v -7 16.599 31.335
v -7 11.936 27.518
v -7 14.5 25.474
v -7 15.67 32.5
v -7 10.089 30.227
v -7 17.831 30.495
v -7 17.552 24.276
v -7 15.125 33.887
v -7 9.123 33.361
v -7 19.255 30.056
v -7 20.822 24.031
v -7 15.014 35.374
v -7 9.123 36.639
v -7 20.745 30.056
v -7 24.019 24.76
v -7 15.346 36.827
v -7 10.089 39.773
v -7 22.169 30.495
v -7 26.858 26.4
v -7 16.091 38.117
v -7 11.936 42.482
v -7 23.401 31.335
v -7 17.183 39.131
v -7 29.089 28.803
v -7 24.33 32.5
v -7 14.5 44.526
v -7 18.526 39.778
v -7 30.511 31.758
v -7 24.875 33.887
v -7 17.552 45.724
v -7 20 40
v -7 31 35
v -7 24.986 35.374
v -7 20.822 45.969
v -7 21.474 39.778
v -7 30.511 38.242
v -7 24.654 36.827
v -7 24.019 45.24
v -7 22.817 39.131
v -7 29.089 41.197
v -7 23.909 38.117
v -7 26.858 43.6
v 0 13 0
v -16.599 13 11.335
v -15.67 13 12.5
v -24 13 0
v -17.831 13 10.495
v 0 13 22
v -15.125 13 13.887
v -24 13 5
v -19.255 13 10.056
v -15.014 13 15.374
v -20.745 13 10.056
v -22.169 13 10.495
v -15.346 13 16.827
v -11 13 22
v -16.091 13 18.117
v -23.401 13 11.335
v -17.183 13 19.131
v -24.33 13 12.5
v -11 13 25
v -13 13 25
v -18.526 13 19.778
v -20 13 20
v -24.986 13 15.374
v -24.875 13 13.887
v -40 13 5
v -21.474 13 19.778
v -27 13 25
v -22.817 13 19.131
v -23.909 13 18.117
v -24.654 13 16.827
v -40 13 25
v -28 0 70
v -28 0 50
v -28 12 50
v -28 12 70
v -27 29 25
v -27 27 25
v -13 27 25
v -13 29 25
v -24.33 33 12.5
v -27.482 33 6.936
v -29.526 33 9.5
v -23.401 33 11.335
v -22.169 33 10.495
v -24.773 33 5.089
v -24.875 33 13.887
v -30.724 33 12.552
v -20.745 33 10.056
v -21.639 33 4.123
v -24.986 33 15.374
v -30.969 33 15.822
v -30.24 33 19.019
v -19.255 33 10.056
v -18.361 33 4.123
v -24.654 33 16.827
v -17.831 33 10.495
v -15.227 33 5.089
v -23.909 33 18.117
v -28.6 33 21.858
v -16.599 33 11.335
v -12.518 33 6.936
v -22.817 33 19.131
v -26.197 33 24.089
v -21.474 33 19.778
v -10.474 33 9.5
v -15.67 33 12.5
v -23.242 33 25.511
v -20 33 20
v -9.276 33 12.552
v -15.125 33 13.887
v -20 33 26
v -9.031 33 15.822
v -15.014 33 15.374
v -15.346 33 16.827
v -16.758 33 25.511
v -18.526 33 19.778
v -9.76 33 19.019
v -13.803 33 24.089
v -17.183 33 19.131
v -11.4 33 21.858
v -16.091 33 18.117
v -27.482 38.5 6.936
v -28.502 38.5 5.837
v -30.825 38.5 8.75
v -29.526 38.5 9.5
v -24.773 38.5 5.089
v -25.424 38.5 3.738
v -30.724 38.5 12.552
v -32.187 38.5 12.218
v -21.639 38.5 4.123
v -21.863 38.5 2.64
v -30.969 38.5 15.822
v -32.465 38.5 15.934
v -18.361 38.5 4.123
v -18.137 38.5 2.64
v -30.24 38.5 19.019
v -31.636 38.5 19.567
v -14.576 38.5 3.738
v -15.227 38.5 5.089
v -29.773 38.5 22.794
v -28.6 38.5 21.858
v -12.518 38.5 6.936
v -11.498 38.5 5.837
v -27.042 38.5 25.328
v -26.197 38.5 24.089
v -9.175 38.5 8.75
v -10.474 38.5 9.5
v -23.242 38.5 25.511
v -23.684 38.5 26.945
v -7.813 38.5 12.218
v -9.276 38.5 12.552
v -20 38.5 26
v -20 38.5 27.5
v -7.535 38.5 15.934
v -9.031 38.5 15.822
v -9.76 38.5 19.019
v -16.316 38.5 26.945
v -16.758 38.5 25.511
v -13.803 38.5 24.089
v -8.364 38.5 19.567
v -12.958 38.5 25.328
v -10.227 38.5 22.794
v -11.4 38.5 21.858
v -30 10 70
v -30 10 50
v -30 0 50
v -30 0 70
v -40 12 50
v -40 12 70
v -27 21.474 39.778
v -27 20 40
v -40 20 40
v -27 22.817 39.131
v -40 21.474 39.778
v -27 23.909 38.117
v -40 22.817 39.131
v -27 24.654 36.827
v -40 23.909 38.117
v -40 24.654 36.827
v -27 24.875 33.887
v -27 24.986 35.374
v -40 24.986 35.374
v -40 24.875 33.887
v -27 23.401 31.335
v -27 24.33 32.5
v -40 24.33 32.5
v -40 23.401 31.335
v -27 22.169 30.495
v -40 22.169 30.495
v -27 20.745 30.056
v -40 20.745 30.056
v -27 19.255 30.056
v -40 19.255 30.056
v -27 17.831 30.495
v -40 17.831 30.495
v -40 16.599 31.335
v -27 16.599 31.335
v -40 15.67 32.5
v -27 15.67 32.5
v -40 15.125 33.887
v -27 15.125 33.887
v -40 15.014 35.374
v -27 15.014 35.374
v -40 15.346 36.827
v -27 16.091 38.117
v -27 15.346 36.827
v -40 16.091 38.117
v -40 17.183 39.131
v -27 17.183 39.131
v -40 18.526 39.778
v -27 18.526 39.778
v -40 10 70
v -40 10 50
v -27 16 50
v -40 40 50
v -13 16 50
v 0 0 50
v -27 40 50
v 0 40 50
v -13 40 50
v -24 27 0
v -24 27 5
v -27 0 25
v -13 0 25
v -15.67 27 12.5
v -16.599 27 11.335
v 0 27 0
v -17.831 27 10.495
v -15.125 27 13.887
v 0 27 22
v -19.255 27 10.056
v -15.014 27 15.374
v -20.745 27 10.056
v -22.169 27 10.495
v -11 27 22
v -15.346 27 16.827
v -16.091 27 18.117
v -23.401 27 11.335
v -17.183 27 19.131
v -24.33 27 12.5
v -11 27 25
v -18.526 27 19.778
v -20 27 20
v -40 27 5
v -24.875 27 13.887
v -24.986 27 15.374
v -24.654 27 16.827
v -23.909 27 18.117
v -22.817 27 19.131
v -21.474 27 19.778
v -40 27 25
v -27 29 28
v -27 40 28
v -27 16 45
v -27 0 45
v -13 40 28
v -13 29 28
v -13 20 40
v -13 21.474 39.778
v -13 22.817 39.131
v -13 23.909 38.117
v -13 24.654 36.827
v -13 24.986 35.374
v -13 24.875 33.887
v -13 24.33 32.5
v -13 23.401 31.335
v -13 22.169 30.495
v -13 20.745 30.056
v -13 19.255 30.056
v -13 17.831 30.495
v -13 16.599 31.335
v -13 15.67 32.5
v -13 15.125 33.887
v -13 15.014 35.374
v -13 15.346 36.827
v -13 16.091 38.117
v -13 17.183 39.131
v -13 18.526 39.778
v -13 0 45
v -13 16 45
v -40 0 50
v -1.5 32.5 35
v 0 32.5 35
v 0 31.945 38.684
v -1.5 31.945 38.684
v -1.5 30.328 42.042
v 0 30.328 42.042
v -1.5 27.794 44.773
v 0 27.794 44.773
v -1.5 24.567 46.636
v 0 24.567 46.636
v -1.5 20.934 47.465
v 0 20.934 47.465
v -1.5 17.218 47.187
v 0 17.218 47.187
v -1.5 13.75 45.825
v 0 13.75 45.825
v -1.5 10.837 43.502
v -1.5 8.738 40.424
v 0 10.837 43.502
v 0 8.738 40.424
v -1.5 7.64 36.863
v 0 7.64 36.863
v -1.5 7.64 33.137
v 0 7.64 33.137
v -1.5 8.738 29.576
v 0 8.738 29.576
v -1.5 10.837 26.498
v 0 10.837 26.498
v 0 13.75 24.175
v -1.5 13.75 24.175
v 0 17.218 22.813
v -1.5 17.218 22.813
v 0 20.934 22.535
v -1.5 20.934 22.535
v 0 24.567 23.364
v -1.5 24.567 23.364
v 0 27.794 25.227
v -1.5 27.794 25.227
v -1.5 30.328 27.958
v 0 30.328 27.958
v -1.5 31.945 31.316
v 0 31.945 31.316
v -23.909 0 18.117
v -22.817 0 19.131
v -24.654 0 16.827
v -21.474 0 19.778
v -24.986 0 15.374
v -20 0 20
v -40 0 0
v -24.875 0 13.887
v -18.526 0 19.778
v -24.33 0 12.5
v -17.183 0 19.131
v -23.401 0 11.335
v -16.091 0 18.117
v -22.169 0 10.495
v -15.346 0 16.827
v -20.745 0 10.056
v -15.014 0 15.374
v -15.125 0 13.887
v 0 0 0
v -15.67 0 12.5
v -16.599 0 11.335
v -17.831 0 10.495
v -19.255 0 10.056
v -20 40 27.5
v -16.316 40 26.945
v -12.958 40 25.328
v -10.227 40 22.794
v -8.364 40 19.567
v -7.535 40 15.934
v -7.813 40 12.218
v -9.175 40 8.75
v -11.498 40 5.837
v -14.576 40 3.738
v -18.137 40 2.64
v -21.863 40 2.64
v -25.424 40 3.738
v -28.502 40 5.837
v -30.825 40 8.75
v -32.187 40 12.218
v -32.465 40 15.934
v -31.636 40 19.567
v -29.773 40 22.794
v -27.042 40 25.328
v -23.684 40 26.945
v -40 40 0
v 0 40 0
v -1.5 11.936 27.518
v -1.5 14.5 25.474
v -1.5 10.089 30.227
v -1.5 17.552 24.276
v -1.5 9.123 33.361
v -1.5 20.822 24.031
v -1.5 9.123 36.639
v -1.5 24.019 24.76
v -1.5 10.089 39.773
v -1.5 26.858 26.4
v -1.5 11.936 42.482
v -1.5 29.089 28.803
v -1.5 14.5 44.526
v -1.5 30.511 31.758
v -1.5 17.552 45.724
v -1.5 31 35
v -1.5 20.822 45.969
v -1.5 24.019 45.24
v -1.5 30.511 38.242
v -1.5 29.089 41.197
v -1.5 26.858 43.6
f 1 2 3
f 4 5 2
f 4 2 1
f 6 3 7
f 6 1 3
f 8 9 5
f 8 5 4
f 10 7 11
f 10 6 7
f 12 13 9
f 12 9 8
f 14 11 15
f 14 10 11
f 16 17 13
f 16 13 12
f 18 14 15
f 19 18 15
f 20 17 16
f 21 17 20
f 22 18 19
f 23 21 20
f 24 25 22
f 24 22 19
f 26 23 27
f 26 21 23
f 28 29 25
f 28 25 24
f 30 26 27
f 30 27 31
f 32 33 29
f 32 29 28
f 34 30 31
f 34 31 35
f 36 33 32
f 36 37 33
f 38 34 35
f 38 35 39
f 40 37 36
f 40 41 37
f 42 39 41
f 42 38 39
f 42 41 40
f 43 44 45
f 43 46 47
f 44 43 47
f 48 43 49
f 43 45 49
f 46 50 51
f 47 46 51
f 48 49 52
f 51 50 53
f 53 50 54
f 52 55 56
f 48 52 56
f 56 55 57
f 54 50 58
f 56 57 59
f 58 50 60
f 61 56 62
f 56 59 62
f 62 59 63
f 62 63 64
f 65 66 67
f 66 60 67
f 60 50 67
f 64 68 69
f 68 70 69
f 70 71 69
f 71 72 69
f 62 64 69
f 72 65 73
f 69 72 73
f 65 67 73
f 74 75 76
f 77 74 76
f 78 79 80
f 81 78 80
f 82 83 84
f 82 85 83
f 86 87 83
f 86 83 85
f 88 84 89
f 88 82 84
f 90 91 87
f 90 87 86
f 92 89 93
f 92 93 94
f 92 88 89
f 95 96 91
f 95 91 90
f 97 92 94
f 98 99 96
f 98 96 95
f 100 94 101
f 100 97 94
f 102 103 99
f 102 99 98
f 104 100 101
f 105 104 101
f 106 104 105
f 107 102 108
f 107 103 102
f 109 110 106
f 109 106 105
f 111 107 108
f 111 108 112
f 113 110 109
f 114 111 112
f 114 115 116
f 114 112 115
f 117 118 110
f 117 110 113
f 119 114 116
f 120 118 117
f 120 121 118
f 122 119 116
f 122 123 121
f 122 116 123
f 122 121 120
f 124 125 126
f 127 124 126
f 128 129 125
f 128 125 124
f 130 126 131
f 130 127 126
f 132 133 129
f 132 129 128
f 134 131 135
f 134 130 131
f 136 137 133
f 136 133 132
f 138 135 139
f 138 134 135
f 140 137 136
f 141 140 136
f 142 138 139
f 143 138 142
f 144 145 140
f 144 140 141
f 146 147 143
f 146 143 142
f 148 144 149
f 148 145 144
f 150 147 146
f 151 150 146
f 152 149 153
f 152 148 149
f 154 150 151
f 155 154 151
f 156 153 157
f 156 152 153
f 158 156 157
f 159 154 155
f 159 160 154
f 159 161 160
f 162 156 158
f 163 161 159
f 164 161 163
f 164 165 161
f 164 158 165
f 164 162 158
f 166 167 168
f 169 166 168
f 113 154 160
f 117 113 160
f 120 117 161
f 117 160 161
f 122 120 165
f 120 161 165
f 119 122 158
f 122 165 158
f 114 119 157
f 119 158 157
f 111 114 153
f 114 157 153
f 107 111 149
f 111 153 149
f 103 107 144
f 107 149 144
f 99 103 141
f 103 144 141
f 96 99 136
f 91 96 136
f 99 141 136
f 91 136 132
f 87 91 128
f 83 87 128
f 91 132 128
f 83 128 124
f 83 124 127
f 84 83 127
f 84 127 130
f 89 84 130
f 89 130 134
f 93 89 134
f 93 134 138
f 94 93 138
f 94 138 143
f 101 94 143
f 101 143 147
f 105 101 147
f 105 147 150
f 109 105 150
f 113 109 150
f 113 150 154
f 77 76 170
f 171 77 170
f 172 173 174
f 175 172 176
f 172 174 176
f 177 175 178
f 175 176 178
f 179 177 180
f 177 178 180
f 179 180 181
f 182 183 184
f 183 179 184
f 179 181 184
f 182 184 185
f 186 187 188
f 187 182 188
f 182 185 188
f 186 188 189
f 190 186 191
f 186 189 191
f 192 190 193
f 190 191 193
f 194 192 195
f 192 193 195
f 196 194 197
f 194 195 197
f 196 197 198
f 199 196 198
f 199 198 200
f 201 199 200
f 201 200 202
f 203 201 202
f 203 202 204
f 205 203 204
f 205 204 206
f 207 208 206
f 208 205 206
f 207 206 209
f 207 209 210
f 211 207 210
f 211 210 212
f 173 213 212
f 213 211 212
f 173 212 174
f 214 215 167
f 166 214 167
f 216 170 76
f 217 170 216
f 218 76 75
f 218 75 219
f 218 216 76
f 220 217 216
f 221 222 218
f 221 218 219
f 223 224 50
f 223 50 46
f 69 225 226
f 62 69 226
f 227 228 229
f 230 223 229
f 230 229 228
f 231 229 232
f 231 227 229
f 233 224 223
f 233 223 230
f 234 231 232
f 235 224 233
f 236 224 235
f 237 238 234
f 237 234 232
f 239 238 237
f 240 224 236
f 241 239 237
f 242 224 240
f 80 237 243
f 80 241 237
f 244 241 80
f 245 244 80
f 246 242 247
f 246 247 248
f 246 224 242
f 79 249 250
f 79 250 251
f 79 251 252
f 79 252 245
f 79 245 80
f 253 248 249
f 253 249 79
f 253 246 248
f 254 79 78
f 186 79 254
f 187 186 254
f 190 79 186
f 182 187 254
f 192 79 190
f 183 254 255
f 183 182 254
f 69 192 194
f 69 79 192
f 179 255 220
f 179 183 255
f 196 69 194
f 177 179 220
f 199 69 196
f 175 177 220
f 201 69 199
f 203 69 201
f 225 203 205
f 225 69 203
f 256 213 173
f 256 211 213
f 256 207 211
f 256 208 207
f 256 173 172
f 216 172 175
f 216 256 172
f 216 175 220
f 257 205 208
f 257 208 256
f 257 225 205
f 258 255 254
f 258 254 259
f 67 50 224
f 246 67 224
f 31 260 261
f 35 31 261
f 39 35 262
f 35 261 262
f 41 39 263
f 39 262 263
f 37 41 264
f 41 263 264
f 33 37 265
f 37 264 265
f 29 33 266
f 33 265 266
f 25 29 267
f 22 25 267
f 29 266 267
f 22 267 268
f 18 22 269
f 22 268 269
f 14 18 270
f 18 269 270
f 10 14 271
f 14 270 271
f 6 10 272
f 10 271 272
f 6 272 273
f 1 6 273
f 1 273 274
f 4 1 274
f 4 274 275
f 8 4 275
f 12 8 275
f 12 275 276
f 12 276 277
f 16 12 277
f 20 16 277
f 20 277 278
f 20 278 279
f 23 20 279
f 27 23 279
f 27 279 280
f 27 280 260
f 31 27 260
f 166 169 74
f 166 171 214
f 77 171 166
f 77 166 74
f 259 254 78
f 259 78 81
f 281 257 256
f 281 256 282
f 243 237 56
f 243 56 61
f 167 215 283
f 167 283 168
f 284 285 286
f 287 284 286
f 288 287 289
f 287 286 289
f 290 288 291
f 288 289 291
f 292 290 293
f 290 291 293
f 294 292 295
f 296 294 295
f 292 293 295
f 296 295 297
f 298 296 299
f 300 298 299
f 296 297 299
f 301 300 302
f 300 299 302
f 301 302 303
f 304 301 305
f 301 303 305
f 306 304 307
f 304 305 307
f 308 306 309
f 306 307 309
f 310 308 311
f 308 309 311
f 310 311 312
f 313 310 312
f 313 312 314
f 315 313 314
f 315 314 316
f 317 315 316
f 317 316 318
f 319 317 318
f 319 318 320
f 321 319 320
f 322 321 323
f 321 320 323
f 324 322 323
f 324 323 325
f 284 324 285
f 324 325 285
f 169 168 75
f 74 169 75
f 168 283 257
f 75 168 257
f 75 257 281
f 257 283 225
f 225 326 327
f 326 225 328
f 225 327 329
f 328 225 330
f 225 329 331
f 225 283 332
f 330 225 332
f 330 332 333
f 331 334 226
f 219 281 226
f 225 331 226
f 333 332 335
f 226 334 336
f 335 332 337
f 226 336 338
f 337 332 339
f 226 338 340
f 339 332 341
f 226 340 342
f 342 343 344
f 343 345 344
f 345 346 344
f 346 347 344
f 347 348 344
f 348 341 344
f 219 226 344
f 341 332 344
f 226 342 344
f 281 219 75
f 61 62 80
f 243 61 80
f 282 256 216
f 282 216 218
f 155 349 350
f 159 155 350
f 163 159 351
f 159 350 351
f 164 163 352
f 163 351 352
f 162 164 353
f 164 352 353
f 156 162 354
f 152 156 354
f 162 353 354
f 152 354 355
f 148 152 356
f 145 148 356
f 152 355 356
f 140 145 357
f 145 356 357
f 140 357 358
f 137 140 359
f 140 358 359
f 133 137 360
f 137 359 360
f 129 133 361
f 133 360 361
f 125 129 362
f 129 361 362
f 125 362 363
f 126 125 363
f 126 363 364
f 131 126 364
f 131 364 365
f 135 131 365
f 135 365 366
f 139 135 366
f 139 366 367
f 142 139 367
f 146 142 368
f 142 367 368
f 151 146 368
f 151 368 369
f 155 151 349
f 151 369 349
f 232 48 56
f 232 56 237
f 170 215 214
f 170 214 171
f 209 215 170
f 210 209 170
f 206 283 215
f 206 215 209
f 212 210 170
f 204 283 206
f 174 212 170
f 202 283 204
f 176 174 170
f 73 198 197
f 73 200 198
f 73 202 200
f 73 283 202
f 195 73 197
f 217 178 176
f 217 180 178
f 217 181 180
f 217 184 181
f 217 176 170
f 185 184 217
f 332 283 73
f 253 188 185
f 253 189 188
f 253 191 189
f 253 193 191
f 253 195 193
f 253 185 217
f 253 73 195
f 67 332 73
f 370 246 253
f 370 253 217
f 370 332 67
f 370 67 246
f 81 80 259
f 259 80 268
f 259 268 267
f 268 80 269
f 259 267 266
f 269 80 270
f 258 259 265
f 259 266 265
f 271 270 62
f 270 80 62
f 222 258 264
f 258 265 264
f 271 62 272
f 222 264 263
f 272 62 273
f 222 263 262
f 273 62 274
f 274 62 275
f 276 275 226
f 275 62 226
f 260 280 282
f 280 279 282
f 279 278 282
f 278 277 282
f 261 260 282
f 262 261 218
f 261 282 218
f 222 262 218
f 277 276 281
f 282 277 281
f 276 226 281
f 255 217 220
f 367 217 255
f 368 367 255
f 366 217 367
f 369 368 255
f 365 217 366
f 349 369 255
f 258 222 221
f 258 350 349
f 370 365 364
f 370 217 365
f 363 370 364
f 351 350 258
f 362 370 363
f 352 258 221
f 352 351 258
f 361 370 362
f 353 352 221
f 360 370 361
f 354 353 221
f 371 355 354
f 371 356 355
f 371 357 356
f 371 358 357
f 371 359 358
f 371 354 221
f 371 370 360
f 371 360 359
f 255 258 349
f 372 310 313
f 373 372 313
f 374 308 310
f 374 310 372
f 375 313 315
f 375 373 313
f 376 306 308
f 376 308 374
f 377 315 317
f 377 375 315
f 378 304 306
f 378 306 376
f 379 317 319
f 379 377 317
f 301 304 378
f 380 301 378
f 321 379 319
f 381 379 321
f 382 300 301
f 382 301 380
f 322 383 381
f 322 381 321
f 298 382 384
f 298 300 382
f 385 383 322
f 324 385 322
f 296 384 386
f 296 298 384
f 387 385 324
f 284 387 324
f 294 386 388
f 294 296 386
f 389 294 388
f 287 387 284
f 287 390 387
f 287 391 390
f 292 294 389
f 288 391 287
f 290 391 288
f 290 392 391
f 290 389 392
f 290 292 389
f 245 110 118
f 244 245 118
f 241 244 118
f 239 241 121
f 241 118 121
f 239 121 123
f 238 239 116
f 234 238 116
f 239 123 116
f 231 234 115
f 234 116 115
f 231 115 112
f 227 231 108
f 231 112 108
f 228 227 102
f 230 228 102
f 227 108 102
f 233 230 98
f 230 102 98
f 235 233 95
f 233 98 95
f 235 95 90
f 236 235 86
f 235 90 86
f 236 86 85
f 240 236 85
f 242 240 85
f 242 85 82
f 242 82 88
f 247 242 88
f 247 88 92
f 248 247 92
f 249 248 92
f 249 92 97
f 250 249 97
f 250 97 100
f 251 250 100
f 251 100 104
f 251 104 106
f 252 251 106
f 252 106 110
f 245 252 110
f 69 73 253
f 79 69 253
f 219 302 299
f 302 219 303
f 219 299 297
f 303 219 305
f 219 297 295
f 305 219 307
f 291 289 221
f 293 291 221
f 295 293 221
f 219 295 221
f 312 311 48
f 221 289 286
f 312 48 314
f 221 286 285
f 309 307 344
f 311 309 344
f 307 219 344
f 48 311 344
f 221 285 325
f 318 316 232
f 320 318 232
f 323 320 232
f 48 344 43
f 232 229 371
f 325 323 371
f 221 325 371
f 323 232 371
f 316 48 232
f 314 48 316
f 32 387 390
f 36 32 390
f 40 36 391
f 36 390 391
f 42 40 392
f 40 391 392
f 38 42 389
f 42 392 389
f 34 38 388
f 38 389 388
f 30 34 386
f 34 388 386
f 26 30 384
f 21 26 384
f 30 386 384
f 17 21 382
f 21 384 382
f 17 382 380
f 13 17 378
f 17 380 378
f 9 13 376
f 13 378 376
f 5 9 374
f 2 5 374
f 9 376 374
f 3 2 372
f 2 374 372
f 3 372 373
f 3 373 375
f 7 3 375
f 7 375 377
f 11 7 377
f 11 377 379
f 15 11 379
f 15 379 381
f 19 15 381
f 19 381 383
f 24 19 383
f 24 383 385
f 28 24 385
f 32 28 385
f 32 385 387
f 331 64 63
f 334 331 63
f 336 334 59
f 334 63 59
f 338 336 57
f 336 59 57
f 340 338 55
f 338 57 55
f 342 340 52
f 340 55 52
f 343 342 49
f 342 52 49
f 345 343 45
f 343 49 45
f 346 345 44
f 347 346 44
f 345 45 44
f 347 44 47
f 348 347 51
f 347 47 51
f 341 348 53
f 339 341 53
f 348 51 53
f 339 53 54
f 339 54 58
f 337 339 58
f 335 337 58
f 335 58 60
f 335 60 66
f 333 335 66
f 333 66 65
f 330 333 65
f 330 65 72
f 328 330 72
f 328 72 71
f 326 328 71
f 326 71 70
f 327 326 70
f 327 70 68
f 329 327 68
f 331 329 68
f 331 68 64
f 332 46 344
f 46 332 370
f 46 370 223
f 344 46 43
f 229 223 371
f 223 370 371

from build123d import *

# Parameters (mm, degrees)
ESQUISSE1_W              = 40
ESQUISSE1_H              = 40
BOSS_EXTRU_1_DEPTH       = 50
ESQUISSE2_R              = 5
ENL_V_MAT_EXTRU_1_DEPTH  = 41
ESQUISSE3_R              = 5
ENL_V_MAT_EXTRU_2_DEPTH  = 41
ESQUISSE4_W              = 20
ESQUISSE4_H              = 14
ENL_V_MAT_EXTRU_3_DEPTH  = 29
ESQUISSE5_W              = 14
ESQUISSE5_H              = 20
ENL_V_MAT_EXTRU_4_DEPTH  = 29
ESQUISSE6_W              = 22
ESQUISSE6_H              = 14
ENL_V_MAT_EXTRU_5_DEPTH  = 24
ESQUISSE7_W              = 14
ESQUISSE7_H              = 22
ENL_V_MAT_EXTRU_6_DEPTH  = 24
ESQUISSE8_R              = 11
ENL_V_MAT_EXTRU_7_DEPTH  = 7
ESQUISSE9_R              = 12.5
ENL_V_MAT_EXTRU_8_DEPTH  = 1.5
ESQUISSE10_R             = 11
ENL_V_MAT_EXTRU_9_DEPTH  = 7
ESQUISSE11_R             = 12.5
ENL_V_MAT_EXTRU_10_DEPTH = 1.5
BOSS_EXTRU_2_DEPTH       = 20


with BuildPart() as part:
    # Esquisse1 → Boss.-Extru.1 (new body)
    with BuildSketch(Plane.XY):
        with Locations((-20, 20)):
            Rectangle(ESQUISSE1_W, ESQUISSE1_H)
    extrude(amount=BOSS_EXTRU_1_DEPTH)

    # Esquisse2 → Enlèv. mat.-Extru.1 (cut, through all)
    with BuildSketch(Plane(origin=(0, 40, 0), x_dir=(1, 0, 0), z_dir=(0, 1, 0))):
        with Locations(Location((-20, -15, 0), (0, 0, 270))):  # turned: the seam where the file's is
            Circle(ESQUISSE2_R)
    extrude(amount=-ENL_V_MAT_EXTRU_1_DEPTH, mode=Mode.SUBTRACT)

    # Esquisse3 → Enlèv. mat.-Extru.2 (cut, through all)
    with BuildSketch(Plane.ZY.offset(40)):
        with Locations((35, 20)):
            Circle(ESQUISSE3_R)
    extrude(amount=-ENL_V_MAT_EXTRU_2_DEPTH, mode=Mode.SUBTRACT)

    # Esquisse4 → Enlèv. mat.-Extru.3 (cut)
    with BuildSketch(Plane.ZY.offset(40)):
        with Locations((15, 20)):
            Rectangle(ESQUISSE4_W, ESQUISSE4_H)
    extrude(amount=-ENL_V_MAT_EXTRU_3_DEPTH, mode=Mode.SUBTRACT)

    # Esquisse5 → Enlèv. mat.-Extru.4 (cut)
    with BuildSketch(Plane.XZ):
        with Locations((-20, 35)):
            Rectangle(ESQUISSE5_W, ESQUISSE5_H)
    extrude(amount=-ENL_V_MAT_EXTRU_4_DEPTH, mode=Mode.SUBTRACT)

    # Esquisse6 → Enlèv. mat.-Extru.5 (cut)
    with BuildSketch(Plane(origin=(0, 0, 0), x_dir=(0, 0, -1), z_dir=(1, 0, 0))):
        with Locations((-11, 20)):
            Rectangle(ESQUISSE6_W, ESQUISSE6_H)
    extrude(amount=-ENL_V_MAT_EXTRU_5_DEPTH, mode=Mode.SUBTRACT)

    # Esquisse7 → Enlèv. mat.-Extru.6 (cut)
    with BuildSketch(Plane(origin=(0, 40, 0), x_dir=(1, 0, 0), z_dir=(0, 1, 0))):
        with Locations((-20, -39)):
            Rectangle(ESQUISSE7_W, ESQUISSE7_H)
    extrude(amount=-ENL_V_MAT_EXTRU_6_DEPTH, mode=Mode.SUBTRACT)

    # Esquisse8 → Enlèv. mat.-Extru.7 (cut)
    with BuildSketch(Plane(origin=(0, 0, 0), x_dir=(0, 0, -1), z_dir=(1, 0, 0))):
        with Locations(Location((-35, 20, 0), (0, 0, 90))):  # turned: the seam where the file's is
            Circle(ESQUISSE8_R)
    extrude(amount=-ENL_V_MAT_EXTRU_7_DEPTH, mode=Mode.SUBTRACT)

    # Esquisse9 → Enlèv. mat.-Extru.8 (cut)
    with BuildSketch(Plane(origin=(0, 0, 0), x_dir=(0, 0, -1), z_dir=(1, 0, 0))):
        with Locations(Location((-35, 20, 0), (0, 0, 90))):  # turned: the seam where the file's is
            Circle(ESQUISSE9_R)
    extrude(amount=-ENL_V_MAT_EXTRU_8_DEPTH, mode=Mode.SUBTRACT)

    # Esquisse10 → Enlèv. mat.-Extru.9 (cut)
    with BuildSketch(Plane(origin=(0, 40, 0), x_dir=(1, 0, 0), z_dir=(0, 1, 0))):
        with Locations(Location((-20, -15, 0), (0, 0, 270))):  # turned: the seam where the file's is
            Circle(ESQUISSE10_R)
    extrude(amount=-ENL_V_MAT_EXTRU_9_DEPTH, mode=Mode.SUBTRACT)

    # Esquisse11 → Enlèv. mat.-Extru.10 (cut)
    with BuildSketch(Plane(origin=(0, 40, 0), x_dir=(1, 0, 0), z_dir=(0, 1, 0))):
        with Locations(Location((-20, -15, 0), (0, 0, 270))):  # turned: the seam where the file's is
            Circle(ESQUISSE11_R)
    extrude(amount=-ENL_V_MAT_EXTRU_10_DEPTH, mode=Mode.SUBTRACT)

    # Esquisse13 → Boss.-Extru.2 (add)
    with BuildSketch(Plane.XY.offset(50)):
        Polygon((-40, 10), (-30, 10), (-30, 0), (-28, 0), (-28, 12), (-40, 12), align=None)
    extrude(amount=BOSS_EXTRU_2_DEPTH)


solid = part.part
